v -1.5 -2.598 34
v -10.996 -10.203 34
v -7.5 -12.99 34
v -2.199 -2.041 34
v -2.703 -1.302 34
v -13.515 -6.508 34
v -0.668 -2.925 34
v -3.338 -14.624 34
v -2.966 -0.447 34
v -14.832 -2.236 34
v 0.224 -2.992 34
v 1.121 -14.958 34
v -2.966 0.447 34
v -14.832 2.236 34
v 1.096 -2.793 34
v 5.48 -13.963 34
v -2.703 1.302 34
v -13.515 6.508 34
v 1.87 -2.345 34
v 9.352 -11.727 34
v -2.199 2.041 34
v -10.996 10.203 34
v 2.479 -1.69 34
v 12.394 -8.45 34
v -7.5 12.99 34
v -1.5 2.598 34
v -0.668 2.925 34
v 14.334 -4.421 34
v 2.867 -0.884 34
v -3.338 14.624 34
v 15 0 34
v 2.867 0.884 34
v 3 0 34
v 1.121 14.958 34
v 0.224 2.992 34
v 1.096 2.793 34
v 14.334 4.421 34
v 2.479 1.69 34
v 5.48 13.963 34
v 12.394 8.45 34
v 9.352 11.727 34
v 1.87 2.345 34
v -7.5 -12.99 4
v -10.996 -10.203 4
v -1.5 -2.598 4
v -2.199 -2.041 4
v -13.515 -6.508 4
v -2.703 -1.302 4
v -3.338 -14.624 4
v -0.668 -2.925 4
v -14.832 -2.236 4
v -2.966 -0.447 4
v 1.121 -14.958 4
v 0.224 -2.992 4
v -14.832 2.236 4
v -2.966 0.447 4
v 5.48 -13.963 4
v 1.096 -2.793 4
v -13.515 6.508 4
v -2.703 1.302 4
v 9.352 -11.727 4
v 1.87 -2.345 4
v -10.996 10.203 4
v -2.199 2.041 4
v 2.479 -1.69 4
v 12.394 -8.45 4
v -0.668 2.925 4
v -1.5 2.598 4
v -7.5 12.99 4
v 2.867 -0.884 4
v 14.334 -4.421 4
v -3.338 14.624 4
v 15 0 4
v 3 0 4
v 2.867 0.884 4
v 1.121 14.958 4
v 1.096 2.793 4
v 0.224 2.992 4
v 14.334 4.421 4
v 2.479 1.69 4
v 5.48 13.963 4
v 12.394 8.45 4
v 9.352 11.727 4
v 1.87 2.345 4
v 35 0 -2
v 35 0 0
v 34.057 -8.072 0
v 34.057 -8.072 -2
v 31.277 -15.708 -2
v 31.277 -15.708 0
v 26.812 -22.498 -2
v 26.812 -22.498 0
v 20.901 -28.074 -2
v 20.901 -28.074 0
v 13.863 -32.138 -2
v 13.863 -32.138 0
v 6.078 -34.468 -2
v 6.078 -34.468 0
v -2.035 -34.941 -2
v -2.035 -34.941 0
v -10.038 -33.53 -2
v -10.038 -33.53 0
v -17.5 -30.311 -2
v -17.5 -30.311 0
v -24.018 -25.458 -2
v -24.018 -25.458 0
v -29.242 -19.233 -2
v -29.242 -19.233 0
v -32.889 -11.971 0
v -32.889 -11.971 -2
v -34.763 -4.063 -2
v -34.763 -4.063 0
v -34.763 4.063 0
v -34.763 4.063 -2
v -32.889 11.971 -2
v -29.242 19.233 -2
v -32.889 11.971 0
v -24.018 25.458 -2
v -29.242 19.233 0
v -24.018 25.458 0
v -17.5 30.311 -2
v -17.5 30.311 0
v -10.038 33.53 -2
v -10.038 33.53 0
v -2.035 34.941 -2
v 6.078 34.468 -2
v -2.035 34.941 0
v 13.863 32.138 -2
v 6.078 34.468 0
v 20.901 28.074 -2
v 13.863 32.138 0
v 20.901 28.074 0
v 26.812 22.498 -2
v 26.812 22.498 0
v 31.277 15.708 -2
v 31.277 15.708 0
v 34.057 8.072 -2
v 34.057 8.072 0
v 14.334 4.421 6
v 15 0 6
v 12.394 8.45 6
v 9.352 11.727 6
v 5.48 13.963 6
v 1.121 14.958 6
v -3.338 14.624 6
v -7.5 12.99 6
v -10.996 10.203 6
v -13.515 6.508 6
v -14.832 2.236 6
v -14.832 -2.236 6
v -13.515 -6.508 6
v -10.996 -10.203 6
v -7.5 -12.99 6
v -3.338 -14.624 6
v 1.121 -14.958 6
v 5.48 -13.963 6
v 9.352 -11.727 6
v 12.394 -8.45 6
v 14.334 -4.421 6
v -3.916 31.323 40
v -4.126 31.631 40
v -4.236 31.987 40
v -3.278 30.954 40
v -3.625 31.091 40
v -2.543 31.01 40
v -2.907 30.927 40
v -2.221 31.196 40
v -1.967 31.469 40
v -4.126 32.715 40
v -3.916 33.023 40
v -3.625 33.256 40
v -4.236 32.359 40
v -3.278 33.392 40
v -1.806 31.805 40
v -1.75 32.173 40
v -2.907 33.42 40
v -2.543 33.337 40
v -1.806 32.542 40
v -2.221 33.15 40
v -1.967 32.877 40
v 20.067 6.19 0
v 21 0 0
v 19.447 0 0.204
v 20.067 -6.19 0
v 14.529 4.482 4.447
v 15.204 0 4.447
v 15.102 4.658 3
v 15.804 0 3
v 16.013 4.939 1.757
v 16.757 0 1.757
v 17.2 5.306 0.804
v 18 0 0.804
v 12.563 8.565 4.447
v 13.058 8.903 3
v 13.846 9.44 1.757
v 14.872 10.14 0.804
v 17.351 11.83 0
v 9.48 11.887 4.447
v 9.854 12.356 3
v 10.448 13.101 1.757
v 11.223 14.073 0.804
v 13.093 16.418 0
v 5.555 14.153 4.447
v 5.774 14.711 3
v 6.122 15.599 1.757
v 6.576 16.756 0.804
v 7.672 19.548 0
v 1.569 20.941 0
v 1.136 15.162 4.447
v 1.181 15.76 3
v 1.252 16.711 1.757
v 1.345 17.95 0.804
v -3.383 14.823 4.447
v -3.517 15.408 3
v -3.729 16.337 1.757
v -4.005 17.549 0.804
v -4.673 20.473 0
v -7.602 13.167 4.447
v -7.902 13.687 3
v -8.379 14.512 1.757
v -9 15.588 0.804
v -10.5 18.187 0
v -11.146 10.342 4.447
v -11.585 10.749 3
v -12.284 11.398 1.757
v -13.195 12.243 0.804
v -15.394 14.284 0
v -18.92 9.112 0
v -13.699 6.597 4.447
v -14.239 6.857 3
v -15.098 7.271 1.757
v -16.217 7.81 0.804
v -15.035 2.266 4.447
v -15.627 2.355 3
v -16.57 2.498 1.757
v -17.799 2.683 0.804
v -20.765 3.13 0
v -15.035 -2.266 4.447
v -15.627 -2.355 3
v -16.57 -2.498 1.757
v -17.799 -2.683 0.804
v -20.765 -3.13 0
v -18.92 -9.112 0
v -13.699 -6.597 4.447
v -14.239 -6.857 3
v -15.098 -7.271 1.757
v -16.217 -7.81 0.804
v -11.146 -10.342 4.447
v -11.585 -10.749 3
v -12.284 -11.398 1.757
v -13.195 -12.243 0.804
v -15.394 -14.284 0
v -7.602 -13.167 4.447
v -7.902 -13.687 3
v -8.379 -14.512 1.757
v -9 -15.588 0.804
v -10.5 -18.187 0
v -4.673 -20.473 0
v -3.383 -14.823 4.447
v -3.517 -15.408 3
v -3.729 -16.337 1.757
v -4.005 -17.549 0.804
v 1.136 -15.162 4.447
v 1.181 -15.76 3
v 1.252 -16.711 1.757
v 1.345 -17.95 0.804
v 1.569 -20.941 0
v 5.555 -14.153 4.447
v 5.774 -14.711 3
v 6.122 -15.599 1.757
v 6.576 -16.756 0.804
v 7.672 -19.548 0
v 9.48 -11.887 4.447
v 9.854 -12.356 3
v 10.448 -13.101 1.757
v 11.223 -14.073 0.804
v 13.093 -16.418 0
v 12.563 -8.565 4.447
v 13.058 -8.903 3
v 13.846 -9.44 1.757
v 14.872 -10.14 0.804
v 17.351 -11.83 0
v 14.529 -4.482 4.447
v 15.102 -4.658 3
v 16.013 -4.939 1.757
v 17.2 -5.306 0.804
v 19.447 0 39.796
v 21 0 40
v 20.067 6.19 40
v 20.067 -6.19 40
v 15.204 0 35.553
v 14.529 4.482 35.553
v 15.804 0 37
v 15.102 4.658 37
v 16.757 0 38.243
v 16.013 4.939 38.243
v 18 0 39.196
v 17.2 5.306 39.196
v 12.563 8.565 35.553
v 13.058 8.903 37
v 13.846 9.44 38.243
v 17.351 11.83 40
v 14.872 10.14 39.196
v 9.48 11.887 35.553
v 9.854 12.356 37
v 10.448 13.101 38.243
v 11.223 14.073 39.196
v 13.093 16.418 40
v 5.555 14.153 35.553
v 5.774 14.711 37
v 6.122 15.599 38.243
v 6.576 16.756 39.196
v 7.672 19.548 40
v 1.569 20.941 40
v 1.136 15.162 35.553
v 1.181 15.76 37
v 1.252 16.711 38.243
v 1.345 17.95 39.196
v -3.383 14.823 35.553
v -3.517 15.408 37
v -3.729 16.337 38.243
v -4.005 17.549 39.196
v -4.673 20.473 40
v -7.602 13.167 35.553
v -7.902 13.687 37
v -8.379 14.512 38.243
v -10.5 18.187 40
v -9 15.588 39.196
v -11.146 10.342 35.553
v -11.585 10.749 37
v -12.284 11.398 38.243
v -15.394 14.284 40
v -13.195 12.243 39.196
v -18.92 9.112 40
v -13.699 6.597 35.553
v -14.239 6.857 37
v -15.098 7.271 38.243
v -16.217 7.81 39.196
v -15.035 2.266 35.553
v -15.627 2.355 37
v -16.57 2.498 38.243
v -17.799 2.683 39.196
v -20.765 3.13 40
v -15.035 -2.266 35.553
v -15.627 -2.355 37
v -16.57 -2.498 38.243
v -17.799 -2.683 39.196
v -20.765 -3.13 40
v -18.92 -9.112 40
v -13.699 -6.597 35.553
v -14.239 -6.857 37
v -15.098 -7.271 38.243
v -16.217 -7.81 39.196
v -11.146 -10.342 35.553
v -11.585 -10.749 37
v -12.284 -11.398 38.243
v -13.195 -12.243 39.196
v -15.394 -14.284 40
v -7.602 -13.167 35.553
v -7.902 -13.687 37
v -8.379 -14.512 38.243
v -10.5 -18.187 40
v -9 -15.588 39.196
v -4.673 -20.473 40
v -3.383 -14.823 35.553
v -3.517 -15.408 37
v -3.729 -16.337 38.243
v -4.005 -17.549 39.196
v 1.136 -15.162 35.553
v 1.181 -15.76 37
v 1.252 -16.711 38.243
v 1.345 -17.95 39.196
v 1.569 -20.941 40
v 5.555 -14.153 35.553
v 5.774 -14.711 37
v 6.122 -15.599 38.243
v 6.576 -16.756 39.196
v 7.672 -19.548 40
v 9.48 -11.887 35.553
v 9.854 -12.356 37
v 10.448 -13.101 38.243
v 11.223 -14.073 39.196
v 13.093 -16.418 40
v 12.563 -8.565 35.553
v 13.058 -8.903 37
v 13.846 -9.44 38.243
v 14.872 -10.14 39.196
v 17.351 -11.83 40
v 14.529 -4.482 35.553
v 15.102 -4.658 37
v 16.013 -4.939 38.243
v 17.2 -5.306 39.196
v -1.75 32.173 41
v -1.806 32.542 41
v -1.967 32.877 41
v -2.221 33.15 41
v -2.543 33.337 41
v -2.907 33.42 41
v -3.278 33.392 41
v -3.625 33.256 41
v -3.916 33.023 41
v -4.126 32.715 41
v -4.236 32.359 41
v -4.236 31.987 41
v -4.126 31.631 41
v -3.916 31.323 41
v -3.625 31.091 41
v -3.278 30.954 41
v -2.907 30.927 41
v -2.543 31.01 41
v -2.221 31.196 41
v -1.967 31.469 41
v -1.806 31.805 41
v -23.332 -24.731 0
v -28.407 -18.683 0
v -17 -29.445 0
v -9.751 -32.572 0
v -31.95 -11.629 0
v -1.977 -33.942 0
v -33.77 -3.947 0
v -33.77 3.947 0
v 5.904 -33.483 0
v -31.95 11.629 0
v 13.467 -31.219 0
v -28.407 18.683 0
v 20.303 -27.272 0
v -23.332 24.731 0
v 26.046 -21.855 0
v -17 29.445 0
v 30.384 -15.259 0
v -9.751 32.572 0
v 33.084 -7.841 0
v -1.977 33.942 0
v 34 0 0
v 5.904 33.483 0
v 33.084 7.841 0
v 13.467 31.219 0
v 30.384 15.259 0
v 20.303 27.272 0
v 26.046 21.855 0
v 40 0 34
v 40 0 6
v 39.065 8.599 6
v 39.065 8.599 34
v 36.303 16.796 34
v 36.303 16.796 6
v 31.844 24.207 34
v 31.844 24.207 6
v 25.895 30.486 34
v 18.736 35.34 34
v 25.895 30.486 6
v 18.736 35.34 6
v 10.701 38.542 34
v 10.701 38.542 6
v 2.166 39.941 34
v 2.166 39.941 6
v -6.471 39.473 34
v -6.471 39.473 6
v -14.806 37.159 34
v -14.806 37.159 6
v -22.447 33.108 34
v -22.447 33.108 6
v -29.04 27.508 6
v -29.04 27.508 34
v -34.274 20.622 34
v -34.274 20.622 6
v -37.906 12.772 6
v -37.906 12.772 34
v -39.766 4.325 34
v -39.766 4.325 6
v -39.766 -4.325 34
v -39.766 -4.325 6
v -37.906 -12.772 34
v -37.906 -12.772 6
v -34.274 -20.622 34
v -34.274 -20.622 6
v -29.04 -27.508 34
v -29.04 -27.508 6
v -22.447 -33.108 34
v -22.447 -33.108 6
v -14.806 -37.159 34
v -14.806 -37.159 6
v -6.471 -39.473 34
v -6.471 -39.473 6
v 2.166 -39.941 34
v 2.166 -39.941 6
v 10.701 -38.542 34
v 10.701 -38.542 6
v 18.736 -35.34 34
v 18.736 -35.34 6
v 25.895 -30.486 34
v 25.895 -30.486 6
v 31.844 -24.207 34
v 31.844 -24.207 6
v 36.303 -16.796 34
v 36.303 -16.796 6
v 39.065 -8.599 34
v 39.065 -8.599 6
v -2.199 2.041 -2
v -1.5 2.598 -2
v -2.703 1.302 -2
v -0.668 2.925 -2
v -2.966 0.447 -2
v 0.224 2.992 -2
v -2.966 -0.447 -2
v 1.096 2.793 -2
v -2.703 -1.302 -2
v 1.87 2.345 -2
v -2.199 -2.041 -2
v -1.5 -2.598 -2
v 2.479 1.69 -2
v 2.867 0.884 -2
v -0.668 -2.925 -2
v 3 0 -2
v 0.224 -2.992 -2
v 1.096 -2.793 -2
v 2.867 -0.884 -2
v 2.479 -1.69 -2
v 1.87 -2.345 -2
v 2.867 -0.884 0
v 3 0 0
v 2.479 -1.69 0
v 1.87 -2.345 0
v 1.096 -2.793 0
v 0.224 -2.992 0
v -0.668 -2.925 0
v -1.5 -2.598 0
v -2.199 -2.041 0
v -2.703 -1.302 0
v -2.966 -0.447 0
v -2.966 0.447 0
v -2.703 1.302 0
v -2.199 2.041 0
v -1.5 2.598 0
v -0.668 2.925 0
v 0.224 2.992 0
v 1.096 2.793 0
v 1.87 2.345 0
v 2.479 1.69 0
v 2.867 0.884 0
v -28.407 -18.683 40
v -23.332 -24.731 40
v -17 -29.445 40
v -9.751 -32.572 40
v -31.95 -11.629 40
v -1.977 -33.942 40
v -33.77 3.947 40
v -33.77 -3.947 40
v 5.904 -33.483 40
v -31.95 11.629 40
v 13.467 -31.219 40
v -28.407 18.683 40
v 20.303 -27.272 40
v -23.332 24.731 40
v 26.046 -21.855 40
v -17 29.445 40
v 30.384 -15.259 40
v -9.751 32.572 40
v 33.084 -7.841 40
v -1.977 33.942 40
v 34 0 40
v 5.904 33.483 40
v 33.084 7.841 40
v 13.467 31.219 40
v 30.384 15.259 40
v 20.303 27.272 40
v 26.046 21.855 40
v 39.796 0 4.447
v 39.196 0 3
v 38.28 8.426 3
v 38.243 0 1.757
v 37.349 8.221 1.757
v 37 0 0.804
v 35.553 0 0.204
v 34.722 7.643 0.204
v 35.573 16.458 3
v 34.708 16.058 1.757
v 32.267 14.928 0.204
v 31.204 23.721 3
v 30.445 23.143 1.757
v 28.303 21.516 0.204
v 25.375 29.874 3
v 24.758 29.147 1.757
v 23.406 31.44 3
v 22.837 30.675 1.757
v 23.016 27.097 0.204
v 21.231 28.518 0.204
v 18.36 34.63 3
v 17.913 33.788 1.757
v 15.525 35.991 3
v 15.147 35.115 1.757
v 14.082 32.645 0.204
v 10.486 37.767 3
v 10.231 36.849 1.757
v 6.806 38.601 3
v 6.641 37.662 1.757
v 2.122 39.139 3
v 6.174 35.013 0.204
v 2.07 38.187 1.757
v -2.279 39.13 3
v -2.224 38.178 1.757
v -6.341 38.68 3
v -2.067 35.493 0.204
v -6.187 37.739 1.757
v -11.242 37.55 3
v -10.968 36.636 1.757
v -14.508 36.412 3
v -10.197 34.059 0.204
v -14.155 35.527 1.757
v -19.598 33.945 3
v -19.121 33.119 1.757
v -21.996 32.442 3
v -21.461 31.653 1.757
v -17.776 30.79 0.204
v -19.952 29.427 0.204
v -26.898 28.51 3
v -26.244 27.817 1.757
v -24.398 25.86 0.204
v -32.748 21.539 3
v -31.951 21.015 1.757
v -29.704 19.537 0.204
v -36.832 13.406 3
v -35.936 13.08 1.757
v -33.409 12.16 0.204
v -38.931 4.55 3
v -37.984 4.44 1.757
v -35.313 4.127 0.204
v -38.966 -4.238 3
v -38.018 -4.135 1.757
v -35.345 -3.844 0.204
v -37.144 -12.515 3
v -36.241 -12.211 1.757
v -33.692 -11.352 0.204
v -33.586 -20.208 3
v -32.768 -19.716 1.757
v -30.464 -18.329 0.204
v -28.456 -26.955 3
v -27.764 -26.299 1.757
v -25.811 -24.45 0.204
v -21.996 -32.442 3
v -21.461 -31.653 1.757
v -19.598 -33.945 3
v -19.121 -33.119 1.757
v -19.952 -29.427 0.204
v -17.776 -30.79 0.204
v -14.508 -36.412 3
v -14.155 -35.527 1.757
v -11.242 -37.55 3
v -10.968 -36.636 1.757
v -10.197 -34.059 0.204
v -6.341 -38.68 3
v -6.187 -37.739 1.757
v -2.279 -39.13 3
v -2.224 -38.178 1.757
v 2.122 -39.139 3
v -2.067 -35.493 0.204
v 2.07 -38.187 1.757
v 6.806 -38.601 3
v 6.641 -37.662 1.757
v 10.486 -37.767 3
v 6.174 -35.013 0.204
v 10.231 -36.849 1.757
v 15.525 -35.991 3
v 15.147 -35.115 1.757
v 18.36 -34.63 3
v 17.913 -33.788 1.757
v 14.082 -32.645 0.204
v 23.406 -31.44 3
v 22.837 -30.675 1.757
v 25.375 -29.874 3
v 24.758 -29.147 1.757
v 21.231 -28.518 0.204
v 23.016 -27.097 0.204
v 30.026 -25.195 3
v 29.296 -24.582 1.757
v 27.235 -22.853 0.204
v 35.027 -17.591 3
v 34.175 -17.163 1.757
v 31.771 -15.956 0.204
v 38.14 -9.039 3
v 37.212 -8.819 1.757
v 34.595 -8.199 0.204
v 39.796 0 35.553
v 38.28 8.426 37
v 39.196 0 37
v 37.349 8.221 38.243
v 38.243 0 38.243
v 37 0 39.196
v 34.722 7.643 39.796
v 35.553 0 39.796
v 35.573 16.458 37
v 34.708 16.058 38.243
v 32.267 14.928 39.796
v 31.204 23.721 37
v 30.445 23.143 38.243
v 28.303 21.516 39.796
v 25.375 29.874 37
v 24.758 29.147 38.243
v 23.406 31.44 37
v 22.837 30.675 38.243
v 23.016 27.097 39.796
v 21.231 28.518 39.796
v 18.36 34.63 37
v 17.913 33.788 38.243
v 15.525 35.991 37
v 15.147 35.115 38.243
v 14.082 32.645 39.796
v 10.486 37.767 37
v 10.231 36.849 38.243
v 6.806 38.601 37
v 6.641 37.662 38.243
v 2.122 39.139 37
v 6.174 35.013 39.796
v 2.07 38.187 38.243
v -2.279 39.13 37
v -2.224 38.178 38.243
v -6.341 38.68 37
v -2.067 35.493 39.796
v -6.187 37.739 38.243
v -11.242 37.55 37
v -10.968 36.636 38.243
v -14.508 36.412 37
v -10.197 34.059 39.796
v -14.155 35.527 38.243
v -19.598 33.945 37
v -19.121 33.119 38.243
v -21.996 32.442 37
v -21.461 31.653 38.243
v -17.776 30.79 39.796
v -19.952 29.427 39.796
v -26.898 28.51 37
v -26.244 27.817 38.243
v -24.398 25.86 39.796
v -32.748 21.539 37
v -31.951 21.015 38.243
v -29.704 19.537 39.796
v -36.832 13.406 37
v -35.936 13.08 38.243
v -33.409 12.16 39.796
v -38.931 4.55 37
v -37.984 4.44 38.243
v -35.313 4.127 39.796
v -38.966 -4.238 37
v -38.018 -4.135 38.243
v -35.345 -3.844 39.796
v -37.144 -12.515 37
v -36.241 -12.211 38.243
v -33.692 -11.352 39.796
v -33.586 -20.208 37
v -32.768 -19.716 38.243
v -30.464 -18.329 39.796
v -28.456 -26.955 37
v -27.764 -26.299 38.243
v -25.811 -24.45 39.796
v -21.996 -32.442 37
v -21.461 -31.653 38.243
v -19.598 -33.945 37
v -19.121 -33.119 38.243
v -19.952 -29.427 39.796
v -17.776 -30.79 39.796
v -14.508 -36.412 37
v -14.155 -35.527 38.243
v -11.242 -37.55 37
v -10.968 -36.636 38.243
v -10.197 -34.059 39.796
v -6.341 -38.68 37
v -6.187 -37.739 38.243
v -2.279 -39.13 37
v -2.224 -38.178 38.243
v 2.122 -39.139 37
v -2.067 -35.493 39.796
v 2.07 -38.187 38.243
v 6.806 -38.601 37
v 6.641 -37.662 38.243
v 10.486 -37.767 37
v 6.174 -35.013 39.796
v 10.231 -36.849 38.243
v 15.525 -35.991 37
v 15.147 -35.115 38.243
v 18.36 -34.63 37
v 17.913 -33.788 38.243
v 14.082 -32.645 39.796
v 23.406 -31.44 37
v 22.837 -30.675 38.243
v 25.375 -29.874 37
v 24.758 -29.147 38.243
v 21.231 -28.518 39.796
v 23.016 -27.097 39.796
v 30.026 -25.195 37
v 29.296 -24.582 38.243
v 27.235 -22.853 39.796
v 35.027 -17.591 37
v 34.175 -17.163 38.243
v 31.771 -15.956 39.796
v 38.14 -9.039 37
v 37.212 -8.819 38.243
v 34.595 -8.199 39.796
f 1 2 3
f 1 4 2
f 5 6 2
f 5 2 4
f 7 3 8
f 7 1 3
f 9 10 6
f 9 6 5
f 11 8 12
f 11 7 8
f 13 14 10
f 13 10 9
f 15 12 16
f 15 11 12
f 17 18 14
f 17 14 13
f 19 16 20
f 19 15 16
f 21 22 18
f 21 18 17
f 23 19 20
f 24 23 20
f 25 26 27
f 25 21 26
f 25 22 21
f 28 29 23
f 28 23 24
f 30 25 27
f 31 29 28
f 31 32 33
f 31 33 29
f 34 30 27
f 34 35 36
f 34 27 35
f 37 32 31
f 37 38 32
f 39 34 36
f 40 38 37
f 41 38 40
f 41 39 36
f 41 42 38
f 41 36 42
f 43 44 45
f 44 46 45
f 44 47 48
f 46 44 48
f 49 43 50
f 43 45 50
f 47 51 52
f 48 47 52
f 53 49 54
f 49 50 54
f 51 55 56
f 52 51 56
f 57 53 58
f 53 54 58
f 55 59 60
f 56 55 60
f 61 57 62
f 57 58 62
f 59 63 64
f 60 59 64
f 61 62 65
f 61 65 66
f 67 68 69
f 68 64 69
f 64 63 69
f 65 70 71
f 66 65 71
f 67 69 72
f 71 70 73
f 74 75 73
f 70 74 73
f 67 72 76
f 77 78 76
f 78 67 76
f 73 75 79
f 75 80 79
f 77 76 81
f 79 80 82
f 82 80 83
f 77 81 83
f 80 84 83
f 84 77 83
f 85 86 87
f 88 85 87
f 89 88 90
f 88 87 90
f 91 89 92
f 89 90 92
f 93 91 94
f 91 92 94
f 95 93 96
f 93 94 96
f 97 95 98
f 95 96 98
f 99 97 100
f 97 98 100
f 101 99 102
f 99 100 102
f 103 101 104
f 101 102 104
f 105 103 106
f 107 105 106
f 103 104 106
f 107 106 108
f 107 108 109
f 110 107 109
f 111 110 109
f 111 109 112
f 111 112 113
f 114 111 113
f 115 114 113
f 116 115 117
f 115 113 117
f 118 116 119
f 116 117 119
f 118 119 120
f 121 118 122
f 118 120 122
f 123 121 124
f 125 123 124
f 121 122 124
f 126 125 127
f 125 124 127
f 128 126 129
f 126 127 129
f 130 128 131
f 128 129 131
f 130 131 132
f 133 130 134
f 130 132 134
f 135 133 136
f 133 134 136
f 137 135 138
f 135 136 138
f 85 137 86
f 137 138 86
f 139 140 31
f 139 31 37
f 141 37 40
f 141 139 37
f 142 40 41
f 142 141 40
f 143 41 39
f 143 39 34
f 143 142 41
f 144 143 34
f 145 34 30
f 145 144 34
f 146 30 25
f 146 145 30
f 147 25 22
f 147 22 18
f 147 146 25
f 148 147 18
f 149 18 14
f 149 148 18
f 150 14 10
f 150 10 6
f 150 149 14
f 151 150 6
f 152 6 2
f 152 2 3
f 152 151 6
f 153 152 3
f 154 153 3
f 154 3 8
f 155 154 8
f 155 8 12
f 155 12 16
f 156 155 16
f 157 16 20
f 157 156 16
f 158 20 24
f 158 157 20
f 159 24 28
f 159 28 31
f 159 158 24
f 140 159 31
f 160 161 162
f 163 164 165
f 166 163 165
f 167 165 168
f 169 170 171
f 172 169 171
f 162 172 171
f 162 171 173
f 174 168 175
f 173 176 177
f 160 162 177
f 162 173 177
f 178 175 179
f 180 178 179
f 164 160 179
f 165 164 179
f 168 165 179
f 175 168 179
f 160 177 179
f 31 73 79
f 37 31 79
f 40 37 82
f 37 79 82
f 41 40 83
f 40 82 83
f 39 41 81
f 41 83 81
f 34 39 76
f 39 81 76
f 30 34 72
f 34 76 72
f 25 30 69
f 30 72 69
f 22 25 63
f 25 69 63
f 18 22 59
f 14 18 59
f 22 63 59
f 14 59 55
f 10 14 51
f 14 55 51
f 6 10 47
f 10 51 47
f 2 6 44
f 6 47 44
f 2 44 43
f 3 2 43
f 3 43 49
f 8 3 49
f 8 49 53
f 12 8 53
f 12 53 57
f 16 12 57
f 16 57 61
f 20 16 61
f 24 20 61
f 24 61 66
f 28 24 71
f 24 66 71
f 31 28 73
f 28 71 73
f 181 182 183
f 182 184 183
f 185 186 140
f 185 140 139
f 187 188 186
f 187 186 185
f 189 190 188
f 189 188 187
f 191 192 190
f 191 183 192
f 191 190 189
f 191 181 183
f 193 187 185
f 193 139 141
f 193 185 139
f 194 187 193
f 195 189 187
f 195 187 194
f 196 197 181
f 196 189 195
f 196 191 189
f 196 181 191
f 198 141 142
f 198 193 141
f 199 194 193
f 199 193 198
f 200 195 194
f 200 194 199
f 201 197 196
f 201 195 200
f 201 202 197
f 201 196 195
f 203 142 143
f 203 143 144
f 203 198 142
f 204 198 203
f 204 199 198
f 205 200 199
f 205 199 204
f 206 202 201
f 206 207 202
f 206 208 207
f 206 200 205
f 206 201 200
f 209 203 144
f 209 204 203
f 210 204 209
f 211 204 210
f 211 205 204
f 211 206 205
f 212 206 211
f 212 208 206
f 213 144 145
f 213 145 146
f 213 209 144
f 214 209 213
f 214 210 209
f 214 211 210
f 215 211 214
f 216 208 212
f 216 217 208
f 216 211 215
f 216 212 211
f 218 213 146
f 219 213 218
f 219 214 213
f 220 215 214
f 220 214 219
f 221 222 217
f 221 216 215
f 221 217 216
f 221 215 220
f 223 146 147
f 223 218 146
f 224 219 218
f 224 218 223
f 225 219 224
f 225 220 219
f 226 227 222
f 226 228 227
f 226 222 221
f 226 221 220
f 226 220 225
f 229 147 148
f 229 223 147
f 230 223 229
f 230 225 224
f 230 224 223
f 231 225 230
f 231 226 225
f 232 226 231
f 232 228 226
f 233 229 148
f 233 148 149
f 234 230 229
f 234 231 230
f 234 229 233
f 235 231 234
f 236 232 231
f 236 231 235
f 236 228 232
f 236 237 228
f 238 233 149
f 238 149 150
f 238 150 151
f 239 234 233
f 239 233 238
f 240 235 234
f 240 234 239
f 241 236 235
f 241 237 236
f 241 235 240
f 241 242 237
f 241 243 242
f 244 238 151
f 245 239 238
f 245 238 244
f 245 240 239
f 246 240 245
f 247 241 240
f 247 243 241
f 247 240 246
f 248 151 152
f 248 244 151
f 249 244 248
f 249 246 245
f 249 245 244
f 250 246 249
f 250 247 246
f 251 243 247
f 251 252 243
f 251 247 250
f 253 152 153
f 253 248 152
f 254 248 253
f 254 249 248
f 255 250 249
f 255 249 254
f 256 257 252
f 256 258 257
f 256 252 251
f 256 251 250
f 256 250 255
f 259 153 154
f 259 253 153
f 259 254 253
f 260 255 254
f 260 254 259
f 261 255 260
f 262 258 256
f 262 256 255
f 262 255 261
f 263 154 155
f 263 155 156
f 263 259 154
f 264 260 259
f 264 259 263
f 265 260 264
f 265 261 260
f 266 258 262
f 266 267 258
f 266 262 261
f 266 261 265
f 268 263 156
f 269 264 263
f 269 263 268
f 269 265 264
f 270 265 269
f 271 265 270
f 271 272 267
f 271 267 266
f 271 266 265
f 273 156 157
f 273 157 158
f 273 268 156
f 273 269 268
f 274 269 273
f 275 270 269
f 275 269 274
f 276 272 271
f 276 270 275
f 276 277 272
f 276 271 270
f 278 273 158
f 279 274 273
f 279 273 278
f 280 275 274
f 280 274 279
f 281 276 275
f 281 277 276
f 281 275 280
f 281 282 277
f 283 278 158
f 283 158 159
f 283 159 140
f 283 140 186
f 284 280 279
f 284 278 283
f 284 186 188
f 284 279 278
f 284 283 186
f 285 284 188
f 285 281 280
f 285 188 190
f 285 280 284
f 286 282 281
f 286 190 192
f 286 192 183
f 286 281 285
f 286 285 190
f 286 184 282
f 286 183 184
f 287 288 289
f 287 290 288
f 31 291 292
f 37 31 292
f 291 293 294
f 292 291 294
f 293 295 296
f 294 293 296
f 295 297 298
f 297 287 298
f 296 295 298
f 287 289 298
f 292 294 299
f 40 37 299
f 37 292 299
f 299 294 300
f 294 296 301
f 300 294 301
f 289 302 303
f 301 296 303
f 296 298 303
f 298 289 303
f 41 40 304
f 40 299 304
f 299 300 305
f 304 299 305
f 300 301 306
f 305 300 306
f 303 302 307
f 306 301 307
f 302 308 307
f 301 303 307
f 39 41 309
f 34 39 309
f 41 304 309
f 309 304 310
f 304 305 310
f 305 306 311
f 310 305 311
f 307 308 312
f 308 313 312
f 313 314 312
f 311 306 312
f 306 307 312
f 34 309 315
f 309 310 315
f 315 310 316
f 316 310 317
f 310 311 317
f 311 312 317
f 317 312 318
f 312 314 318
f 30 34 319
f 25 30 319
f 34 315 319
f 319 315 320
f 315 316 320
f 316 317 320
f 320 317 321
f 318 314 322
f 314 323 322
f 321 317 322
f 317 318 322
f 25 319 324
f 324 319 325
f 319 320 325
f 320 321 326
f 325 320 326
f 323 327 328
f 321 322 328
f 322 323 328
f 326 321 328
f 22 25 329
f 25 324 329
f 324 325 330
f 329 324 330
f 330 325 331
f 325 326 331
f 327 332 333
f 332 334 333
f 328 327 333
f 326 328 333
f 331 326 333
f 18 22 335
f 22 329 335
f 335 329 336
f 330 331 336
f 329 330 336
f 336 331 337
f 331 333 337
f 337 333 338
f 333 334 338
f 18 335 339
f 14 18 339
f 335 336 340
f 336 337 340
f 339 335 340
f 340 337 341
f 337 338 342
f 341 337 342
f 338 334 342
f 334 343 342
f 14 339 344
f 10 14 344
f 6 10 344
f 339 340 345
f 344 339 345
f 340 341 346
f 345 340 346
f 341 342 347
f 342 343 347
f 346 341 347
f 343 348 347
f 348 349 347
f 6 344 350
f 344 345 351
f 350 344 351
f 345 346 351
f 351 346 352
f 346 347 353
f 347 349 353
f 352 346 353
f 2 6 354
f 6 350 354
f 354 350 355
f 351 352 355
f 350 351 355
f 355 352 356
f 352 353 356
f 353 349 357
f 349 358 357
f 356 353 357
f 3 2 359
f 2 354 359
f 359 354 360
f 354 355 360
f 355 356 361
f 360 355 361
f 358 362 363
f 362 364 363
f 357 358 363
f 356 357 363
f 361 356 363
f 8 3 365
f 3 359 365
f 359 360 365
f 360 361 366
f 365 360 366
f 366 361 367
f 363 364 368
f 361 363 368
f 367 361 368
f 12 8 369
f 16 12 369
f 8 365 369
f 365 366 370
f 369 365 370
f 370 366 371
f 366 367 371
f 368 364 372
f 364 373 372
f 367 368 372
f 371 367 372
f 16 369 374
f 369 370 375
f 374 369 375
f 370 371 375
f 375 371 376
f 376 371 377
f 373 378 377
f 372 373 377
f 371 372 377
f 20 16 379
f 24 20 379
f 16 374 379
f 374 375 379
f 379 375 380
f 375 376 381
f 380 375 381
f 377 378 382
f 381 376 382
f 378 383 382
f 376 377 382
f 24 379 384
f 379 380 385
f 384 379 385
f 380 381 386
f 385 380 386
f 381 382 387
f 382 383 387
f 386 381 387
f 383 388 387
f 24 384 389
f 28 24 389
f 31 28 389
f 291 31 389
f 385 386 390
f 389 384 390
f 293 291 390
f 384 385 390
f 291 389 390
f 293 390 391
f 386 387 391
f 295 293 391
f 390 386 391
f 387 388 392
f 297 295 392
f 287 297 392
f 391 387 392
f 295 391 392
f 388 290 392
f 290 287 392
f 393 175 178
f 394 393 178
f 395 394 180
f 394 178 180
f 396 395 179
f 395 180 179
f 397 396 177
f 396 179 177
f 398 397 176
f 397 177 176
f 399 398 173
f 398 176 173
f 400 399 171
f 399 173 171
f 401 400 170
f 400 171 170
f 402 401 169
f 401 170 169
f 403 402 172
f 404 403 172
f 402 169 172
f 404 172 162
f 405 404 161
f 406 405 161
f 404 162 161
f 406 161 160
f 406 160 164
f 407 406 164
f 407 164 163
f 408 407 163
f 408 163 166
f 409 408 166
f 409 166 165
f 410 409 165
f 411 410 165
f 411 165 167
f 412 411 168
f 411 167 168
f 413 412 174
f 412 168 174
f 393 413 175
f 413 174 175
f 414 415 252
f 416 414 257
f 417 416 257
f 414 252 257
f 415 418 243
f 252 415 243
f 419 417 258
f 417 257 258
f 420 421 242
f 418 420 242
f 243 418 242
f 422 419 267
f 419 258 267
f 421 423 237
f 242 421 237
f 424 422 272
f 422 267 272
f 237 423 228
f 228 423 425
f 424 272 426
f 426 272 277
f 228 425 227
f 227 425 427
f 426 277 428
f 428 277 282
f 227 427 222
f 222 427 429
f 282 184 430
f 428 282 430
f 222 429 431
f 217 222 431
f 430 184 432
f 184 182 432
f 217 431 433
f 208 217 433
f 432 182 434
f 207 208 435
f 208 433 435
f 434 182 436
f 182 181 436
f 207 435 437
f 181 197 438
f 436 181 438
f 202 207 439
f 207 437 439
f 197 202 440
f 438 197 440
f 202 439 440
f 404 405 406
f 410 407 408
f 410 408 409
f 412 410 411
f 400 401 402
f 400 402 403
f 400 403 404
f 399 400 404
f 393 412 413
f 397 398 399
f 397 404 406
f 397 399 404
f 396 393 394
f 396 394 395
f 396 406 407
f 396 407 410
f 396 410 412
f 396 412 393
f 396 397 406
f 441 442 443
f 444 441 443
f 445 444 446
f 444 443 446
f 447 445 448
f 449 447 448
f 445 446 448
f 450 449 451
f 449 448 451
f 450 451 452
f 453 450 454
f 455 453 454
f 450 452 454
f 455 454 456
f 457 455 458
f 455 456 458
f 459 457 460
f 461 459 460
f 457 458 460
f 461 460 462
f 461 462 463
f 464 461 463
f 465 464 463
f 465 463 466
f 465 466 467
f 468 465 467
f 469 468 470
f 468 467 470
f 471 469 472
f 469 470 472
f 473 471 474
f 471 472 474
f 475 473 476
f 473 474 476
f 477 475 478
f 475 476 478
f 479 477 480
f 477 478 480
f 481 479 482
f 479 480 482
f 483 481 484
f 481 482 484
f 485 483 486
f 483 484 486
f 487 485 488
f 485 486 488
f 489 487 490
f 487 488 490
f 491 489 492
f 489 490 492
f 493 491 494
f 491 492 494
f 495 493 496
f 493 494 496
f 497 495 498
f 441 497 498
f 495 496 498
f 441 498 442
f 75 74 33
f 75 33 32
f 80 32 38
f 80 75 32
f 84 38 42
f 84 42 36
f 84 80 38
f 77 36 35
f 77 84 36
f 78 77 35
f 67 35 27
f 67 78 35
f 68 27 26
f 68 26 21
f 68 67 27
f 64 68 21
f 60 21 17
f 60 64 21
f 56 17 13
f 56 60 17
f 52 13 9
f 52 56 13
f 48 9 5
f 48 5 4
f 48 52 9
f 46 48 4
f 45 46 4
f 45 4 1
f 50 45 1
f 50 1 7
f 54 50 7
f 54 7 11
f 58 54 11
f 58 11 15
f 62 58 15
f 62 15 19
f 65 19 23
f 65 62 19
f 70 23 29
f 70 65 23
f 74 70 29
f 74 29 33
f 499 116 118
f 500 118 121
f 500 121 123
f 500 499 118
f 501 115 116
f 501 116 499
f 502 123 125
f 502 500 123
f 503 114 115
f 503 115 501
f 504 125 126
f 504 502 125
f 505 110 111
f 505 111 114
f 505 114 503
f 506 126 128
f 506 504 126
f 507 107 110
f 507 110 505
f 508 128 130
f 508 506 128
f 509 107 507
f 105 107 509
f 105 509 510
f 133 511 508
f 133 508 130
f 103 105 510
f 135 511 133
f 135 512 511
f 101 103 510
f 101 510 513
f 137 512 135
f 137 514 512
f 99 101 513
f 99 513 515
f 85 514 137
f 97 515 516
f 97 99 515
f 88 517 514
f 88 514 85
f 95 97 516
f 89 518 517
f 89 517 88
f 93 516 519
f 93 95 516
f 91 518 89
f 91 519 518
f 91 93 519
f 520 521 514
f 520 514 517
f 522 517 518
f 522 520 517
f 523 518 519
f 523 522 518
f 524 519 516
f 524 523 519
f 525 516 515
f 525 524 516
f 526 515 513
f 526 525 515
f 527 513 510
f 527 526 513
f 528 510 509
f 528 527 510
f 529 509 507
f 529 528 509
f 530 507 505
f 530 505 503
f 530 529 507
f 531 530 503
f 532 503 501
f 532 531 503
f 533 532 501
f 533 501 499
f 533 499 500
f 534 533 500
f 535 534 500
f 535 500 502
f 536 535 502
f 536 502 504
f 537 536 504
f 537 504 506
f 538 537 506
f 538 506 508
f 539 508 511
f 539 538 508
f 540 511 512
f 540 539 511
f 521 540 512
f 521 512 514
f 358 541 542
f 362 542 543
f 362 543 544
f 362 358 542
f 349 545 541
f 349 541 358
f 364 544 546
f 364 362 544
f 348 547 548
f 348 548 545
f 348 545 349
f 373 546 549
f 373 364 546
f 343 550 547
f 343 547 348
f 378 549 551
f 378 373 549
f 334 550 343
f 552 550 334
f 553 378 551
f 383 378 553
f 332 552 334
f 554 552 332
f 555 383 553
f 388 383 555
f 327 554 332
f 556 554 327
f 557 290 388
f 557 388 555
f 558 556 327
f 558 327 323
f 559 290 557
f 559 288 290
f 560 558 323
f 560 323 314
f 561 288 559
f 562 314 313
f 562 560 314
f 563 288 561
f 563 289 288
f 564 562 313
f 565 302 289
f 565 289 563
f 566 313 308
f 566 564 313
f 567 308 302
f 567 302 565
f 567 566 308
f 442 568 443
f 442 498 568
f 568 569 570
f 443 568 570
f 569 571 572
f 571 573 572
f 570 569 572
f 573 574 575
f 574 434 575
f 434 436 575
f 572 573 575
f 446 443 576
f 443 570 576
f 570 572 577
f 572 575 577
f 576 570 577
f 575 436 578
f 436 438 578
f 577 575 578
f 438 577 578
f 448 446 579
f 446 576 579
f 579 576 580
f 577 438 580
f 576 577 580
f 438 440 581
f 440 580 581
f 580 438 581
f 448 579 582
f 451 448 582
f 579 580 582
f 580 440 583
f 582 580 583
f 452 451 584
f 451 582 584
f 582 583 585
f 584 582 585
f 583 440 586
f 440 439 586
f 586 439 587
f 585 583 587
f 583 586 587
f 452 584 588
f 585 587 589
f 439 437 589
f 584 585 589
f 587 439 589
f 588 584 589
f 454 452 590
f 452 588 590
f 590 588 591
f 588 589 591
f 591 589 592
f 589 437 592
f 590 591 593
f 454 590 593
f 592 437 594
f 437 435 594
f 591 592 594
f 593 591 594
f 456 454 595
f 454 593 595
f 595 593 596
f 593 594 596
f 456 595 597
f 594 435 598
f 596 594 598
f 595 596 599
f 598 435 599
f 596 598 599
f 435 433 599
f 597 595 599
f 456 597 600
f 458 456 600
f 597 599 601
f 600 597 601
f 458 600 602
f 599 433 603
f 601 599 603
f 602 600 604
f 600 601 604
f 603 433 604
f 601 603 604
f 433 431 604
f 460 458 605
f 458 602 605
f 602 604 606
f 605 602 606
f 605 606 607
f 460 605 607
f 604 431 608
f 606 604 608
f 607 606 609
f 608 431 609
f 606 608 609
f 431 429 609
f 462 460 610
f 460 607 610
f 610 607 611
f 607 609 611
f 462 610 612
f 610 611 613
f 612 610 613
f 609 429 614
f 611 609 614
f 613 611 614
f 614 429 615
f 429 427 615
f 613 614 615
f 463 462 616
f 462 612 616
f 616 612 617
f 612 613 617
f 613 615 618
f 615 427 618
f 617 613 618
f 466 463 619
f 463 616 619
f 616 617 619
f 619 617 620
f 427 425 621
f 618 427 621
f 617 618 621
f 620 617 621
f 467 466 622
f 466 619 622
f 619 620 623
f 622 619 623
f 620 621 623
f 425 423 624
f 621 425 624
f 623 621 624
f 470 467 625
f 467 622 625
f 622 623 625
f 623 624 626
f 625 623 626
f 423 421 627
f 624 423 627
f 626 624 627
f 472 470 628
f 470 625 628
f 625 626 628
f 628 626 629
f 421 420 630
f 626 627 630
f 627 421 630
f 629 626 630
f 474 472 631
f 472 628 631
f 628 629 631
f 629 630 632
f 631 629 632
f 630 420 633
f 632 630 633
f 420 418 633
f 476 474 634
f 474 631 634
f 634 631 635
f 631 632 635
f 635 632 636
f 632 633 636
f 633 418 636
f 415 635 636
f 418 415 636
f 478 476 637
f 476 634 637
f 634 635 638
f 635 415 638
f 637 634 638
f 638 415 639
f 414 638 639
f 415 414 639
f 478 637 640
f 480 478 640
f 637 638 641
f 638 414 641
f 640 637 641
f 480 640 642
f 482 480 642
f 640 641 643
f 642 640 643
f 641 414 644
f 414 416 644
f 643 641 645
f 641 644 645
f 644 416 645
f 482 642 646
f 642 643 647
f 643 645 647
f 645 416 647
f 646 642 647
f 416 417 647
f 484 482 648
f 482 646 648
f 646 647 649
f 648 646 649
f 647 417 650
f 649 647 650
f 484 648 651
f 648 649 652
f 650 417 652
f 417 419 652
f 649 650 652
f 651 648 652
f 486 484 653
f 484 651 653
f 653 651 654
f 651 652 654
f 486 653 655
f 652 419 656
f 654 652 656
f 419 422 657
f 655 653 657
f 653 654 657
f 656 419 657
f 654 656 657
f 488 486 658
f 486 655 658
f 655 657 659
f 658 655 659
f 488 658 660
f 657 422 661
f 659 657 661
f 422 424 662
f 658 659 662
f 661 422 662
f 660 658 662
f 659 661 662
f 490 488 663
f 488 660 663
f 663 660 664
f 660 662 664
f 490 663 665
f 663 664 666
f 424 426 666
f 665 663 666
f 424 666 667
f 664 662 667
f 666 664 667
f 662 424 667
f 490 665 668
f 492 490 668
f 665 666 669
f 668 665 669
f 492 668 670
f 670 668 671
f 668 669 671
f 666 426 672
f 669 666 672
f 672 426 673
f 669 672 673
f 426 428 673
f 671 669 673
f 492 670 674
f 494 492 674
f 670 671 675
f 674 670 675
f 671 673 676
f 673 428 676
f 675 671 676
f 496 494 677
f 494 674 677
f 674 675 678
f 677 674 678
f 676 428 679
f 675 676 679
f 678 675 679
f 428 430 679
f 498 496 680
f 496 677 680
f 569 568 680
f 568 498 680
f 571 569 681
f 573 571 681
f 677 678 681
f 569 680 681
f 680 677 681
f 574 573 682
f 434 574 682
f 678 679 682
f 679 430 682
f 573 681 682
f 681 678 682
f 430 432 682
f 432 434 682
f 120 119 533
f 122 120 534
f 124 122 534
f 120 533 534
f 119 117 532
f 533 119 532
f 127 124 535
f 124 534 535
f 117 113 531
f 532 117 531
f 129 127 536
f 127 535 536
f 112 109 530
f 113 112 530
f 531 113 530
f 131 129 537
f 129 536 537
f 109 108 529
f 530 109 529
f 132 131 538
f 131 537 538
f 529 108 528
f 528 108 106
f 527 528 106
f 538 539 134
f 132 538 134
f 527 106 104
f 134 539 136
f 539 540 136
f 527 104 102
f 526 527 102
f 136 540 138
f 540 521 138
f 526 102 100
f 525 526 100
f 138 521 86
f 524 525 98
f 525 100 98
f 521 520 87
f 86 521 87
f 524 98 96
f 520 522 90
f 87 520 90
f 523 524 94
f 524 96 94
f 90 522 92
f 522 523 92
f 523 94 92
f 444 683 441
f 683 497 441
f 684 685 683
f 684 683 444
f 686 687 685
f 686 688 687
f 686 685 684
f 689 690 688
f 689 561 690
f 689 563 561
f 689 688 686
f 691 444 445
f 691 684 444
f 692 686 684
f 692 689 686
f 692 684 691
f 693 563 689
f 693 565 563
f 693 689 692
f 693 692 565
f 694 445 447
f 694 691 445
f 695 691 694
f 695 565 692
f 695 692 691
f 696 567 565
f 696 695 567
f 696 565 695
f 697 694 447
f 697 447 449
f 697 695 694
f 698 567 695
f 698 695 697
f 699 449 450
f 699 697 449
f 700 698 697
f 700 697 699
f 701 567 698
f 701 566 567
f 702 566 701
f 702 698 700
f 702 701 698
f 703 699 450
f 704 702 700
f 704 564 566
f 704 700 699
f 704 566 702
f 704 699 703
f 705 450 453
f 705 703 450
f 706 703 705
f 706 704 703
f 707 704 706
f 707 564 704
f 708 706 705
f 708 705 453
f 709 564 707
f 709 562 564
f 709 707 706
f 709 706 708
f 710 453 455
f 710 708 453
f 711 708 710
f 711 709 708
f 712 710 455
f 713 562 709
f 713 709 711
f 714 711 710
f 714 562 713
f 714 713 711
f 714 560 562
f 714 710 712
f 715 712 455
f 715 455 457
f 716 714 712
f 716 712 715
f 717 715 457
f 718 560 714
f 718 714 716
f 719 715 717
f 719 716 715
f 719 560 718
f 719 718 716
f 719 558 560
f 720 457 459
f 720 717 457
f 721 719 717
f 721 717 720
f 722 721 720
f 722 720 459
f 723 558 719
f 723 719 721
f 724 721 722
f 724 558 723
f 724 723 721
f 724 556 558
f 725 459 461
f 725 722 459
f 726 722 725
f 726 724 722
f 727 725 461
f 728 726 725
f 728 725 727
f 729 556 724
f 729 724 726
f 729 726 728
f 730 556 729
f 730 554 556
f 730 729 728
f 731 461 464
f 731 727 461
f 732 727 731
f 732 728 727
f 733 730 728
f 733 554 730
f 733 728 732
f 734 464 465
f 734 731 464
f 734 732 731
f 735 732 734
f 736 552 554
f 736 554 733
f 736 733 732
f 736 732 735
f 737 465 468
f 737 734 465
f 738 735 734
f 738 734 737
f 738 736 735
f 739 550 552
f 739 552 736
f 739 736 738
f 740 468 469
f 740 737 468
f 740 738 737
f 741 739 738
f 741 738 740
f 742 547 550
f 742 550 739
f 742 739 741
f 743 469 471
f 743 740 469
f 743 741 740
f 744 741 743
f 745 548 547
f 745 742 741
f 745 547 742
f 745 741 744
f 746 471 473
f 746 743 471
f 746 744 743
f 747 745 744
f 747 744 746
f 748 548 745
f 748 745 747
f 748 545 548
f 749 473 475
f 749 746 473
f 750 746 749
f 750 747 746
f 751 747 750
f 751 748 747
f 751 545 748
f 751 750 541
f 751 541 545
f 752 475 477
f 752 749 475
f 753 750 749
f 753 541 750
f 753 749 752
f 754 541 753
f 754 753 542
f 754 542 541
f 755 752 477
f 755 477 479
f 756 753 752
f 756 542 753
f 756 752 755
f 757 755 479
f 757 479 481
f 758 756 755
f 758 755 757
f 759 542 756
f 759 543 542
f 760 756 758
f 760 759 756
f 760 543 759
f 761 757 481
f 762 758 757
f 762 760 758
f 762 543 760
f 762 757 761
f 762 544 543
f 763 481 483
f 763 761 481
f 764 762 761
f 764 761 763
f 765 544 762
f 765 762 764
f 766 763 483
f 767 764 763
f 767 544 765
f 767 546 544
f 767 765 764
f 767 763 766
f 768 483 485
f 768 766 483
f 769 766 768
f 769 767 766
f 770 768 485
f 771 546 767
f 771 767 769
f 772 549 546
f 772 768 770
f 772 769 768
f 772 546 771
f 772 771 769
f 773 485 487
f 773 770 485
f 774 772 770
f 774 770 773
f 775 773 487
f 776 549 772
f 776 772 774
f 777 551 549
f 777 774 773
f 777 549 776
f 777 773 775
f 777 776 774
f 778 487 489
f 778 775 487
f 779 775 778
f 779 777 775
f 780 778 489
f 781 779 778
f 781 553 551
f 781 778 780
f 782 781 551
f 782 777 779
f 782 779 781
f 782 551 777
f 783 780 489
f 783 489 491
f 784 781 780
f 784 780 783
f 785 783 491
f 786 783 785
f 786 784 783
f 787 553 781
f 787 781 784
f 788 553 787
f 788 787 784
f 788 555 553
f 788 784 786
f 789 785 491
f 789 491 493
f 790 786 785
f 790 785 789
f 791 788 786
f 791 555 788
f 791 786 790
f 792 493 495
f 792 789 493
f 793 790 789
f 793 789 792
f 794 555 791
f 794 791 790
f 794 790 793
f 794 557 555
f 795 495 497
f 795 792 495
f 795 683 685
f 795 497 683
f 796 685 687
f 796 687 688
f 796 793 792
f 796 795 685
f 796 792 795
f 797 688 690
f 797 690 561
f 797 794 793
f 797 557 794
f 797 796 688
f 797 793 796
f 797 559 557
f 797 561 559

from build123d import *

# Parameters (mm, degrees)
F0_R     = 40
F0_R_2   = 15
F1_DEPTH = 40
F2_R     = 6
F4_R     = 15
F4_R_2   = 3
F5_DEPTH = 30
F6_R     = 1.25
F7_DEPTH = 1
F8_R     = 35
F8_R_2   = 3
F9_DEPTH = 2


with BuildPart() as f1:
    # F0 (on Top) → F1 (new body)
    with BuildSketch(Plane.XY):
        Circle(F0_R)
        Circle(F0_R_2, mode=Mode.SUBTRACT)
    extrude(amount=F1_DEPTH)

    # F2
    f2_edges = [f1.edges().sort_by_distance(p)[0] for p in [
        (-15, 0, 40),
        (-40, 0, 40),
        (-40, 0, 0),
        (-15, 0, 0),
    ]]
    fillet(f2_edges, radius=F2_R)


with BuildPart() as f5:
    # F4 (on offset) → F5 (new body)
    with BuildSketch(Plane.XY.offset(4)):
        Circle(F4_R)
        Circle(F4_R_2, mode=Mode.SUBTRACT)
    extrude(amount=F5_DEPTH)


with BuildPart() as f7:
    # F6 (on face) → F7 (new body)
    with BuildSketch(Plane.XY.offset(40)):
        with Locations((-3, 32.173138)):
            Circle(F6_R)
    extrude(amount=F7_DEPTH)


with BuildPart() as f9:
    # F8 (on face) → F9 (new body)
    with BuildSketch(Plane(origin=(0, 0, 0), x_dir=(1, 0, 0), z_dir=(0, 0, -1))):
        Circle(F8_R)
        Circle(F8_R_2, mode=Mode.SUBTRACT)
    extrude(amount=F9_DEPTH)


solid = Compound([f1.part, f5.part, f7.part, f9.part])
